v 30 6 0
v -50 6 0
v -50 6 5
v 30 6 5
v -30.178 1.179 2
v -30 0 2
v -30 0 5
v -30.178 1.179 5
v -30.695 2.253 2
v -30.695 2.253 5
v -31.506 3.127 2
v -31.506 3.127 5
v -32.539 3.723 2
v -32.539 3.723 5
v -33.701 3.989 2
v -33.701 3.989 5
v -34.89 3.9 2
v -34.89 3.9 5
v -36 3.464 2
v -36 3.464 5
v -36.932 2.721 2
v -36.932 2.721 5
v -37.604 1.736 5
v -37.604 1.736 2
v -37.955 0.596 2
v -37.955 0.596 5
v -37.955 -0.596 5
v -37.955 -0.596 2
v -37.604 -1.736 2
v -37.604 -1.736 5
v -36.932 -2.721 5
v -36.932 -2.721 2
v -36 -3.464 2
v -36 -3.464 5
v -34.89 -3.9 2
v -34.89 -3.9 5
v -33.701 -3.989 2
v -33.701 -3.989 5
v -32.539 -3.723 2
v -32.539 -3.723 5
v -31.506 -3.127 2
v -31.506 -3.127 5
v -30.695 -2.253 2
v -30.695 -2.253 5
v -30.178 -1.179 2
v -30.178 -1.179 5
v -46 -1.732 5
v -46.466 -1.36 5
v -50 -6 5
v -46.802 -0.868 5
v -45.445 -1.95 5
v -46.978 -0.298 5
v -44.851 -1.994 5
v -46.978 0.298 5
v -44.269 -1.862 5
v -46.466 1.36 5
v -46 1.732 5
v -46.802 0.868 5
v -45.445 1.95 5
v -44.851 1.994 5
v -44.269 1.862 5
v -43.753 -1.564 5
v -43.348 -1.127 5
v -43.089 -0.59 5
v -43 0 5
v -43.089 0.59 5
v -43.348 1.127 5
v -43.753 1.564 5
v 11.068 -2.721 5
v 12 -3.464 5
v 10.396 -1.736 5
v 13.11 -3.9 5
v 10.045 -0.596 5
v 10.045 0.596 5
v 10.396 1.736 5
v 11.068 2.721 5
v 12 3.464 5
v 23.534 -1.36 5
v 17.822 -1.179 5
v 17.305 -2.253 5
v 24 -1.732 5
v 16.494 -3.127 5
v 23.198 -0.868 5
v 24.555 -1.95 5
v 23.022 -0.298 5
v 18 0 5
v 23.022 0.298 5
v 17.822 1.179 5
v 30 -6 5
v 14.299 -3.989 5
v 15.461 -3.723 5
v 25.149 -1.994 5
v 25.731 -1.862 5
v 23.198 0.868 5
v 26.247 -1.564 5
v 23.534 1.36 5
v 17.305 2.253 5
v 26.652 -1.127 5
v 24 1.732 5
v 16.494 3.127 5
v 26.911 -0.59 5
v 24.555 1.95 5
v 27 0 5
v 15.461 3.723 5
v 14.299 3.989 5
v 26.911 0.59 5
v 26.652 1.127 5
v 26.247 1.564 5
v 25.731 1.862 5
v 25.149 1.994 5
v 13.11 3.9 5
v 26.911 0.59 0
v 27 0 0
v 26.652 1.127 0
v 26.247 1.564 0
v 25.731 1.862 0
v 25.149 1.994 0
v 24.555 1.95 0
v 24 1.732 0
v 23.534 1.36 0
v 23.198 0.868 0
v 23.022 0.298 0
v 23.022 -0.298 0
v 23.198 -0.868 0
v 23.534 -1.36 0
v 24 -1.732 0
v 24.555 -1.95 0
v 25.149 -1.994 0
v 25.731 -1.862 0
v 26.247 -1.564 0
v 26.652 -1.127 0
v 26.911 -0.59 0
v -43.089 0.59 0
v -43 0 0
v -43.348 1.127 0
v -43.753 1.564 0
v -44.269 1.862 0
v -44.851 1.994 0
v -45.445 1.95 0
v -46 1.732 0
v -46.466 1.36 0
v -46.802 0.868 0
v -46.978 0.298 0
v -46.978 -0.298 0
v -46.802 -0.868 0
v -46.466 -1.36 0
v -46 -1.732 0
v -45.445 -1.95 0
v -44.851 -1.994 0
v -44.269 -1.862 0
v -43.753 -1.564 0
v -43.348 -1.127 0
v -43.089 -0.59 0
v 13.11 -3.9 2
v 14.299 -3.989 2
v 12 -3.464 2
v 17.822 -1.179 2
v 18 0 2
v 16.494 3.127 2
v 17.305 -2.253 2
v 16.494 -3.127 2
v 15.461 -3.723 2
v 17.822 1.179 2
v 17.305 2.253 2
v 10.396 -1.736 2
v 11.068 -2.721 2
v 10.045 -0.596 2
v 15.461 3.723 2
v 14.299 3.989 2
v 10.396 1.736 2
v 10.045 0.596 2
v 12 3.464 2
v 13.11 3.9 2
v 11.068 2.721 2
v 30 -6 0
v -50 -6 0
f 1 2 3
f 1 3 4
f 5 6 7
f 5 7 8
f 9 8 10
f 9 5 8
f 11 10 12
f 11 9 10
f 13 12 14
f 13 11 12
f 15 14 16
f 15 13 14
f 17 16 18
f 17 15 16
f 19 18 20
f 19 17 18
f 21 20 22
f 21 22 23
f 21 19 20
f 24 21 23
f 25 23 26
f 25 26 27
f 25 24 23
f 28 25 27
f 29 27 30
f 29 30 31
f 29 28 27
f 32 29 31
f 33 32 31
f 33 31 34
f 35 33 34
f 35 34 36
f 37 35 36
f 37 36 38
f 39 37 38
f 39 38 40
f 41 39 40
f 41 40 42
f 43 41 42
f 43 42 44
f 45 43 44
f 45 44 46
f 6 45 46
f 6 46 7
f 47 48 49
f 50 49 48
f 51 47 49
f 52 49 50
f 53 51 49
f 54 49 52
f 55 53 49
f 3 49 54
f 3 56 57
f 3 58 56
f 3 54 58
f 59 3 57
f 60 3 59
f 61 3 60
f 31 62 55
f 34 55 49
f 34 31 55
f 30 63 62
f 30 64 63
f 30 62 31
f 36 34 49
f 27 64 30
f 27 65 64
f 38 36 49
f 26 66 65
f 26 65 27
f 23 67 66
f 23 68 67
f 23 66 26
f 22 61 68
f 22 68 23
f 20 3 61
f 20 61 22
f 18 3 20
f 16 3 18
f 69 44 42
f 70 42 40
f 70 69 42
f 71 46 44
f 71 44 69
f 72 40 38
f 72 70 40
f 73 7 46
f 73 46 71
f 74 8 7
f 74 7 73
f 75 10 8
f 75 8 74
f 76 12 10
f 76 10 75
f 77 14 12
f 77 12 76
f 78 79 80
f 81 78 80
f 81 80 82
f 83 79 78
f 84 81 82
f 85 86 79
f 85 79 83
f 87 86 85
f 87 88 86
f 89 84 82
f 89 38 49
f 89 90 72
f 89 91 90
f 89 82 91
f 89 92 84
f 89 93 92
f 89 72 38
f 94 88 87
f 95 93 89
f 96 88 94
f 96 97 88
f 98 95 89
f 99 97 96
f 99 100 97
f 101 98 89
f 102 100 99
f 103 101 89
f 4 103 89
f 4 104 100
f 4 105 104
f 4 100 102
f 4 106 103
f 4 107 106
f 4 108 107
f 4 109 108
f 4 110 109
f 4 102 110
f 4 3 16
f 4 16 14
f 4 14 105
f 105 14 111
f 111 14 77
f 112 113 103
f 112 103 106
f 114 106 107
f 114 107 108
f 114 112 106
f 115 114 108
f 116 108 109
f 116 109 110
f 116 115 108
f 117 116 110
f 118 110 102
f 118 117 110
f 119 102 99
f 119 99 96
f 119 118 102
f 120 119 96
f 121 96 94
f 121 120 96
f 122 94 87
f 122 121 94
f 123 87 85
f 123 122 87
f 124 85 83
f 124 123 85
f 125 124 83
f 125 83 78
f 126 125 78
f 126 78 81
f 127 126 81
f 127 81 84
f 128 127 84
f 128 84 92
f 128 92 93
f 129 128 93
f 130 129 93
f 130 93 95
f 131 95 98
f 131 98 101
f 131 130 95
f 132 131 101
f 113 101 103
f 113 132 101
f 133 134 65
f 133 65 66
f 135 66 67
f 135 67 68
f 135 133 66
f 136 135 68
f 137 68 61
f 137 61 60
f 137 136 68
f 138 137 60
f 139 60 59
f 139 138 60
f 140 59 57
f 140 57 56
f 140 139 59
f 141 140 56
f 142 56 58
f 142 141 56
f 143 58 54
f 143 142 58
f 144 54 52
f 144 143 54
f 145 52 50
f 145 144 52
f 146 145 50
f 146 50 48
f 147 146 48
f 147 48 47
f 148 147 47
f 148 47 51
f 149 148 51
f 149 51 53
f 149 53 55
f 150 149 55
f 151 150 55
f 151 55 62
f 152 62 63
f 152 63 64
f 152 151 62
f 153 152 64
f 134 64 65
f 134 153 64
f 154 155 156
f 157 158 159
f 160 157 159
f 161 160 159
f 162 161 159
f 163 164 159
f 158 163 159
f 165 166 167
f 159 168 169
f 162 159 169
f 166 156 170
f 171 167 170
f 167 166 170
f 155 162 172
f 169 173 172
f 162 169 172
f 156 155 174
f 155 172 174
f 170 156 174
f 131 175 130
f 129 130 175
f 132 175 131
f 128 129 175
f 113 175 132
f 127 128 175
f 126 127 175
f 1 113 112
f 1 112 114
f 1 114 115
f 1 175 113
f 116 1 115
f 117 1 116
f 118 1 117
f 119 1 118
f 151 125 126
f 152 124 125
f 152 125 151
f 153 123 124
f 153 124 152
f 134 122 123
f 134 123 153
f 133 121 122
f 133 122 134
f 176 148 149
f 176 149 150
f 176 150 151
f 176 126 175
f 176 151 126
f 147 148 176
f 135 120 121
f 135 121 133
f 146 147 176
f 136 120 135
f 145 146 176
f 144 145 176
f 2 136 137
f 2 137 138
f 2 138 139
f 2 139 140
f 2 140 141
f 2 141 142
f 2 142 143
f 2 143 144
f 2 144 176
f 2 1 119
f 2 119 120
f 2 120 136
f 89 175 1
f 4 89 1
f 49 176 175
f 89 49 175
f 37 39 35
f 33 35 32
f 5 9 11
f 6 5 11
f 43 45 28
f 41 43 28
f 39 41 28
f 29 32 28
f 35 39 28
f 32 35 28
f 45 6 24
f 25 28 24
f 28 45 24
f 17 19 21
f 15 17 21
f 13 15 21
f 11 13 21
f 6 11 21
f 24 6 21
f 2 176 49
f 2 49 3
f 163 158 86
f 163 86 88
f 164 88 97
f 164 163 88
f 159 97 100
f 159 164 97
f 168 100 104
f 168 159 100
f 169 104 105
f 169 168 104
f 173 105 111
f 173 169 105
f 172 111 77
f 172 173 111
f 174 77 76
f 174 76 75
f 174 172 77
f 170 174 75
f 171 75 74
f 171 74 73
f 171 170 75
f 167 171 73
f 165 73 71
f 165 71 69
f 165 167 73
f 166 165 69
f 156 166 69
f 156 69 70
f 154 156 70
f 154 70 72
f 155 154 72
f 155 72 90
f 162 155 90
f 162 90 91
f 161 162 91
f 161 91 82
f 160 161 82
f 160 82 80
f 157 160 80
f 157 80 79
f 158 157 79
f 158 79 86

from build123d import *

# Parameters (mm, degrees)
SKETCH1_W           = 80
SKETCH1_H           = 12
SKETCH1_R           = 4
SKETCH1_R_2         = 2
BOSS_EXTRUDE1_DEPTH = 5
SKETCH2_R           = 4
BOSS_EXTRUDE2_DEPTH = 2


with BuildPart() as part:
    # Sketch1 → Boss-Extrude1 (new body)
    with BuildSketch(Plane.XY):
        with Locations((-10, 0)):
            Rectangle(SKETCH1_W, SKETCH1_H)
        with Locations((-34, 0)):
            Circle(SKETCH1_R, mode=Mode.SUBTRACT)
        with Locations((14, 0)):
            Circle(SKETCH1_R, mode=Mode.SUBTRACT)
        with Locations((-45, 0)):
            Circle(SKETCH1_R_2, mode=Mode.SUBTRACT)
        with Locations((25, 0)):
            Circle(SKETCH1_R_2, mode=Mode.SUBTRACT)
    extrude(amount=BOSS_EXTRUDE1_DEPTH)

    # Sketch2 → Boss-Extrude2 (add)
    with BuildSketch(Plane(origin=(0, 0, 0), x_dir=(-1, 0, 0), z_dir=(0, 0, -1))):
        with Locations((34, 0)):
            Circle(SKETCH2_R)
        with Locations((-14, 0)):
            Circle(SKETCH2_R)
    extrude(amount=-BOSS_EXTRUDE2_DEPTH)


solid = part.part
